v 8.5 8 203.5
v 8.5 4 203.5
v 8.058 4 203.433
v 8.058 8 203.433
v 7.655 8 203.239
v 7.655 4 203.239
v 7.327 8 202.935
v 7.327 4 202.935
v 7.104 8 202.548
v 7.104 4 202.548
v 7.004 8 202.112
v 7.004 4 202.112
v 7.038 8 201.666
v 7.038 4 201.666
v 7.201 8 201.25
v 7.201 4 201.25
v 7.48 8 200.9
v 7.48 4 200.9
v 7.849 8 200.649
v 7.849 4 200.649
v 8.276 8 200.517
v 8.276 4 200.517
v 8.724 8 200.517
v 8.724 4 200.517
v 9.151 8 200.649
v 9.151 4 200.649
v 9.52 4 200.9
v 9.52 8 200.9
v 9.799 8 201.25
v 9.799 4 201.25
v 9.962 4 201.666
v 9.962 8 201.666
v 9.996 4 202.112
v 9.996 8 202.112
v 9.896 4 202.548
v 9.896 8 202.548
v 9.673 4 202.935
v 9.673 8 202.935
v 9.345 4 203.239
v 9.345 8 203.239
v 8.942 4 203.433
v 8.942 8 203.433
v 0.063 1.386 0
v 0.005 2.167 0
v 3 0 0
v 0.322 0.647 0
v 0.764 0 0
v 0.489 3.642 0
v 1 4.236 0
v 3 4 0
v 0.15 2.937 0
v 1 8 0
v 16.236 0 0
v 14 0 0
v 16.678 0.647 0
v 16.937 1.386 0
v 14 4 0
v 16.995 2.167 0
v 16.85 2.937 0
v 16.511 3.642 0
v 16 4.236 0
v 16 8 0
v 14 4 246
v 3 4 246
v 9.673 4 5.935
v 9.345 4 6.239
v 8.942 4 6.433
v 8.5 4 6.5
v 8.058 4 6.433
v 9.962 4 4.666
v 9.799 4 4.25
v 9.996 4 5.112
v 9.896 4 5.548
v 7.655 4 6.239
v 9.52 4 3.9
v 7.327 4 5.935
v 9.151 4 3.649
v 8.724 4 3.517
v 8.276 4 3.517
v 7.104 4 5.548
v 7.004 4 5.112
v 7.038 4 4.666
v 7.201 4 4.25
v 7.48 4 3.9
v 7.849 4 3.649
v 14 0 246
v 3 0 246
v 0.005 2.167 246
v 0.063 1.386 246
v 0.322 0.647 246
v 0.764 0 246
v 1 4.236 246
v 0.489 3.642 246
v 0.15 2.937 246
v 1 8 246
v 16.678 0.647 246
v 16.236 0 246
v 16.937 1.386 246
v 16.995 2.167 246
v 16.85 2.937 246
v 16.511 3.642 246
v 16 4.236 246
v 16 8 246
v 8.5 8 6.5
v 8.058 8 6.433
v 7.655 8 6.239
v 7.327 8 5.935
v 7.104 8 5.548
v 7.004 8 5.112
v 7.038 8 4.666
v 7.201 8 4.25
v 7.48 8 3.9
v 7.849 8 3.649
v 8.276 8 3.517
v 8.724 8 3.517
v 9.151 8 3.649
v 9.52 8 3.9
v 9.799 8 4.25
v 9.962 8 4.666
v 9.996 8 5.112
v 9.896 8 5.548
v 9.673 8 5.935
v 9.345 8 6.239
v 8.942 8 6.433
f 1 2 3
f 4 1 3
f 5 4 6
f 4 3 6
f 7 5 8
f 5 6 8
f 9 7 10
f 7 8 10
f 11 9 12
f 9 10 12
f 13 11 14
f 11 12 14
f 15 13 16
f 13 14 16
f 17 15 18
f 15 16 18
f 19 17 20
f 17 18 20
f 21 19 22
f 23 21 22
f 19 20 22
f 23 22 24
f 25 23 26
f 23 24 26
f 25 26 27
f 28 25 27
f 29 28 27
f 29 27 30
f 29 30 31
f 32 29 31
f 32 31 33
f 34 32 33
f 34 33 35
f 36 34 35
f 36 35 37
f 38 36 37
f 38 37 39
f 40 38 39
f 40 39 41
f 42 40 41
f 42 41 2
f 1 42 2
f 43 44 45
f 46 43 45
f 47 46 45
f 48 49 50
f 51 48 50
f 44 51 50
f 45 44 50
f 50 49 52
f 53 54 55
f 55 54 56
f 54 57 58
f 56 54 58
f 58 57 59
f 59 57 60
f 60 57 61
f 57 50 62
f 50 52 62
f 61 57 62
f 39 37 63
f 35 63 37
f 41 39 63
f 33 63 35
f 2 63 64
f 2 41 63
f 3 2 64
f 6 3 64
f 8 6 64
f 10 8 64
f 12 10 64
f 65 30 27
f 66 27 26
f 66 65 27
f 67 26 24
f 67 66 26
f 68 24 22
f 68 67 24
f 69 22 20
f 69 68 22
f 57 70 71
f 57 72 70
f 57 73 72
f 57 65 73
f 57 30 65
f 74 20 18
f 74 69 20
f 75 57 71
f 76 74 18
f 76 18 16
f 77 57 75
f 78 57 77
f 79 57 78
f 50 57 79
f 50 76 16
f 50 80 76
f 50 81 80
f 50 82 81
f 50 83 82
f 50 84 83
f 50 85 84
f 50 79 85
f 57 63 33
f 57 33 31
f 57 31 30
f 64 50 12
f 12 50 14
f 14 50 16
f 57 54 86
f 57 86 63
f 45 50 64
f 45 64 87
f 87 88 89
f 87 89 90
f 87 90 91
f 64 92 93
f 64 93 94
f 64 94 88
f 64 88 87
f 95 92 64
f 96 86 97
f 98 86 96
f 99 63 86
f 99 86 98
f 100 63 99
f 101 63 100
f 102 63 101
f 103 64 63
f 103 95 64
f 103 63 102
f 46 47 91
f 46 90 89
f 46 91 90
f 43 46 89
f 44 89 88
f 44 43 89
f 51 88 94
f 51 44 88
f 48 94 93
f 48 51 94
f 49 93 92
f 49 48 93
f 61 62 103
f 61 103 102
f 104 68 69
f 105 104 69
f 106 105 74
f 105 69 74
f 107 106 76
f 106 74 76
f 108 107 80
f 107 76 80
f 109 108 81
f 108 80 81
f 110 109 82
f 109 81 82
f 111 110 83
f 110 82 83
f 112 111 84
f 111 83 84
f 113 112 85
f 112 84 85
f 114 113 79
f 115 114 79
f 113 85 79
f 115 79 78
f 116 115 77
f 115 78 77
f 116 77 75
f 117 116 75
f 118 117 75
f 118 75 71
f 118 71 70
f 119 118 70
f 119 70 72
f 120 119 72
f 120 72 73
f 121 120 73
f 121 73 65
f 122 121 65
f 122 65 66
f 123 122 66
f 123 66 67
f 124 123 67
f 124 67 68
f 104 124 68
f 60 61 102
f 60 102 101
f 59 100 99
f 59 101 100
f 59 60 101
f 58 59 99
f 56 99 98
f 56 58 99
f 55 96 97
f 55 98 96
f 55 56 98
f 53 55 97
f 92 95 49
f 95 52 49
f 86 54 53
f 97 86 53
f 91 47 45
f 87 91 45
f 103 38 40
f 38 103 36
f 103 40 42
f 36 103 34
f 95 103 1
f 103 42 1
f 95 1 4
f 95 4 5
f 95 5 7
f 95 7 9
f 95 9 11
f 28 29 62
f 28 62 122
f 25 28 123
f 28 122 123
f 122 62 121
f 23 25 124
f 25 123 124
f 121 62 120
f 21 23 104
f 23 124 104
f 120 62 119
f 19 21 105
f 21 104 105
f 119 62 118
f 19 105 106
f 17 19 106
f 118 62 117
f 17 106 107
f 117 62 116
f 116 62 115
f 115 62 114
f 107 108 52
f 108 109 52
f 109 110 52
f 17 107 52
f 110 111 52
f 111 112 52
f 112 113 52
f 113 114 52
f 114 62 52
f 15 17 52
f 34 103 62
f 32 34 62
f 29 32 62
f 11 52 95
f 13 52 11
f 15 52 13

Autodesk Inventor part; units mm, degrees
ref_plane "YZ Plane" through (0, 0, 0) normal (1, 0, 0) x (0, 1, 0)
ref_plane "XZ Plane" through (0, 0, 0) normal (0, 1, 0) x (-1, 0, 0)
ref_plane "XY Plane" through (0, 0, 0) normal (0, 0, 1) x (1, 0, 0)
sketch "スケッチ1" plane through (0, 0, 0) normal (0, 0, 1) x (1, 0, 0)
  line L0 (0, 0) -> (16.2361, 0)
  line L1 (17, 8) -> (0, 8)
  line L2 (3, 0) -> (14, 0)
  line L3 (14, 0) -> (14, 4)
  line L4 (14, 4) -> (3, 4)
  line L5 (3, 4) -> (3, 0)
  arc A0 (16.2361, 0) -> (16, 4.2361) centre (14, 2) ccw
  arc A1 (1, 4.2361) -> (0.7639, 0) centre (3, 2) ccw
  line L6 (16, 8) -> (16, 4.2361)
  line L7 (1, 8) -> (1, 4.2361)
  point P0 (8.5, 8)
  point P1 (8.5, 4)
  dimension "d0" = 17
  dimension "d2" = 11
  dimension "d3" = 4
  dimension "d15" = 7.5
  dimension "d16" = 15
  dimension "d17" = 8
  dimension "d18" = 17
extrude "押し出し1" add sketch "スケッチ1" along normal blind 246 contours A1 L7 L1 L6 A0 L0 L3 L4 L5
sketch "スケッチ2" plane through (0, 8, 0) normal (0, 1, 0) x (1, 0, 0)
  line L0 (16, 0) -> (0, 0) projected
  line L1 (-88, 0) -> (-88, -156.2142)
  line L2 (-88, -156.2142) -> (215.5, -300.2142)
  line L3 (3, 0) -> (3, -246) projected
  point P0 (8.5, -5)
  point P1 (8.5, -202)
  point P2 (8, 0)
  point P3 (17, 0)
  point P4 (1, 0)
  dimension "d6" = 5
  dimension "d20" = 96
  dimension "d21" = 303.5
  dimension "d22" = 144
  dimension "d23" = 5.5
  dimension "d24" = 197
hole "穴1" at (8.5, 8, 5) at (8.5, 8, 202) direction (0, -1, 0) diameter 3 depth 8 tip angle 118
properties part number "slider4b"
